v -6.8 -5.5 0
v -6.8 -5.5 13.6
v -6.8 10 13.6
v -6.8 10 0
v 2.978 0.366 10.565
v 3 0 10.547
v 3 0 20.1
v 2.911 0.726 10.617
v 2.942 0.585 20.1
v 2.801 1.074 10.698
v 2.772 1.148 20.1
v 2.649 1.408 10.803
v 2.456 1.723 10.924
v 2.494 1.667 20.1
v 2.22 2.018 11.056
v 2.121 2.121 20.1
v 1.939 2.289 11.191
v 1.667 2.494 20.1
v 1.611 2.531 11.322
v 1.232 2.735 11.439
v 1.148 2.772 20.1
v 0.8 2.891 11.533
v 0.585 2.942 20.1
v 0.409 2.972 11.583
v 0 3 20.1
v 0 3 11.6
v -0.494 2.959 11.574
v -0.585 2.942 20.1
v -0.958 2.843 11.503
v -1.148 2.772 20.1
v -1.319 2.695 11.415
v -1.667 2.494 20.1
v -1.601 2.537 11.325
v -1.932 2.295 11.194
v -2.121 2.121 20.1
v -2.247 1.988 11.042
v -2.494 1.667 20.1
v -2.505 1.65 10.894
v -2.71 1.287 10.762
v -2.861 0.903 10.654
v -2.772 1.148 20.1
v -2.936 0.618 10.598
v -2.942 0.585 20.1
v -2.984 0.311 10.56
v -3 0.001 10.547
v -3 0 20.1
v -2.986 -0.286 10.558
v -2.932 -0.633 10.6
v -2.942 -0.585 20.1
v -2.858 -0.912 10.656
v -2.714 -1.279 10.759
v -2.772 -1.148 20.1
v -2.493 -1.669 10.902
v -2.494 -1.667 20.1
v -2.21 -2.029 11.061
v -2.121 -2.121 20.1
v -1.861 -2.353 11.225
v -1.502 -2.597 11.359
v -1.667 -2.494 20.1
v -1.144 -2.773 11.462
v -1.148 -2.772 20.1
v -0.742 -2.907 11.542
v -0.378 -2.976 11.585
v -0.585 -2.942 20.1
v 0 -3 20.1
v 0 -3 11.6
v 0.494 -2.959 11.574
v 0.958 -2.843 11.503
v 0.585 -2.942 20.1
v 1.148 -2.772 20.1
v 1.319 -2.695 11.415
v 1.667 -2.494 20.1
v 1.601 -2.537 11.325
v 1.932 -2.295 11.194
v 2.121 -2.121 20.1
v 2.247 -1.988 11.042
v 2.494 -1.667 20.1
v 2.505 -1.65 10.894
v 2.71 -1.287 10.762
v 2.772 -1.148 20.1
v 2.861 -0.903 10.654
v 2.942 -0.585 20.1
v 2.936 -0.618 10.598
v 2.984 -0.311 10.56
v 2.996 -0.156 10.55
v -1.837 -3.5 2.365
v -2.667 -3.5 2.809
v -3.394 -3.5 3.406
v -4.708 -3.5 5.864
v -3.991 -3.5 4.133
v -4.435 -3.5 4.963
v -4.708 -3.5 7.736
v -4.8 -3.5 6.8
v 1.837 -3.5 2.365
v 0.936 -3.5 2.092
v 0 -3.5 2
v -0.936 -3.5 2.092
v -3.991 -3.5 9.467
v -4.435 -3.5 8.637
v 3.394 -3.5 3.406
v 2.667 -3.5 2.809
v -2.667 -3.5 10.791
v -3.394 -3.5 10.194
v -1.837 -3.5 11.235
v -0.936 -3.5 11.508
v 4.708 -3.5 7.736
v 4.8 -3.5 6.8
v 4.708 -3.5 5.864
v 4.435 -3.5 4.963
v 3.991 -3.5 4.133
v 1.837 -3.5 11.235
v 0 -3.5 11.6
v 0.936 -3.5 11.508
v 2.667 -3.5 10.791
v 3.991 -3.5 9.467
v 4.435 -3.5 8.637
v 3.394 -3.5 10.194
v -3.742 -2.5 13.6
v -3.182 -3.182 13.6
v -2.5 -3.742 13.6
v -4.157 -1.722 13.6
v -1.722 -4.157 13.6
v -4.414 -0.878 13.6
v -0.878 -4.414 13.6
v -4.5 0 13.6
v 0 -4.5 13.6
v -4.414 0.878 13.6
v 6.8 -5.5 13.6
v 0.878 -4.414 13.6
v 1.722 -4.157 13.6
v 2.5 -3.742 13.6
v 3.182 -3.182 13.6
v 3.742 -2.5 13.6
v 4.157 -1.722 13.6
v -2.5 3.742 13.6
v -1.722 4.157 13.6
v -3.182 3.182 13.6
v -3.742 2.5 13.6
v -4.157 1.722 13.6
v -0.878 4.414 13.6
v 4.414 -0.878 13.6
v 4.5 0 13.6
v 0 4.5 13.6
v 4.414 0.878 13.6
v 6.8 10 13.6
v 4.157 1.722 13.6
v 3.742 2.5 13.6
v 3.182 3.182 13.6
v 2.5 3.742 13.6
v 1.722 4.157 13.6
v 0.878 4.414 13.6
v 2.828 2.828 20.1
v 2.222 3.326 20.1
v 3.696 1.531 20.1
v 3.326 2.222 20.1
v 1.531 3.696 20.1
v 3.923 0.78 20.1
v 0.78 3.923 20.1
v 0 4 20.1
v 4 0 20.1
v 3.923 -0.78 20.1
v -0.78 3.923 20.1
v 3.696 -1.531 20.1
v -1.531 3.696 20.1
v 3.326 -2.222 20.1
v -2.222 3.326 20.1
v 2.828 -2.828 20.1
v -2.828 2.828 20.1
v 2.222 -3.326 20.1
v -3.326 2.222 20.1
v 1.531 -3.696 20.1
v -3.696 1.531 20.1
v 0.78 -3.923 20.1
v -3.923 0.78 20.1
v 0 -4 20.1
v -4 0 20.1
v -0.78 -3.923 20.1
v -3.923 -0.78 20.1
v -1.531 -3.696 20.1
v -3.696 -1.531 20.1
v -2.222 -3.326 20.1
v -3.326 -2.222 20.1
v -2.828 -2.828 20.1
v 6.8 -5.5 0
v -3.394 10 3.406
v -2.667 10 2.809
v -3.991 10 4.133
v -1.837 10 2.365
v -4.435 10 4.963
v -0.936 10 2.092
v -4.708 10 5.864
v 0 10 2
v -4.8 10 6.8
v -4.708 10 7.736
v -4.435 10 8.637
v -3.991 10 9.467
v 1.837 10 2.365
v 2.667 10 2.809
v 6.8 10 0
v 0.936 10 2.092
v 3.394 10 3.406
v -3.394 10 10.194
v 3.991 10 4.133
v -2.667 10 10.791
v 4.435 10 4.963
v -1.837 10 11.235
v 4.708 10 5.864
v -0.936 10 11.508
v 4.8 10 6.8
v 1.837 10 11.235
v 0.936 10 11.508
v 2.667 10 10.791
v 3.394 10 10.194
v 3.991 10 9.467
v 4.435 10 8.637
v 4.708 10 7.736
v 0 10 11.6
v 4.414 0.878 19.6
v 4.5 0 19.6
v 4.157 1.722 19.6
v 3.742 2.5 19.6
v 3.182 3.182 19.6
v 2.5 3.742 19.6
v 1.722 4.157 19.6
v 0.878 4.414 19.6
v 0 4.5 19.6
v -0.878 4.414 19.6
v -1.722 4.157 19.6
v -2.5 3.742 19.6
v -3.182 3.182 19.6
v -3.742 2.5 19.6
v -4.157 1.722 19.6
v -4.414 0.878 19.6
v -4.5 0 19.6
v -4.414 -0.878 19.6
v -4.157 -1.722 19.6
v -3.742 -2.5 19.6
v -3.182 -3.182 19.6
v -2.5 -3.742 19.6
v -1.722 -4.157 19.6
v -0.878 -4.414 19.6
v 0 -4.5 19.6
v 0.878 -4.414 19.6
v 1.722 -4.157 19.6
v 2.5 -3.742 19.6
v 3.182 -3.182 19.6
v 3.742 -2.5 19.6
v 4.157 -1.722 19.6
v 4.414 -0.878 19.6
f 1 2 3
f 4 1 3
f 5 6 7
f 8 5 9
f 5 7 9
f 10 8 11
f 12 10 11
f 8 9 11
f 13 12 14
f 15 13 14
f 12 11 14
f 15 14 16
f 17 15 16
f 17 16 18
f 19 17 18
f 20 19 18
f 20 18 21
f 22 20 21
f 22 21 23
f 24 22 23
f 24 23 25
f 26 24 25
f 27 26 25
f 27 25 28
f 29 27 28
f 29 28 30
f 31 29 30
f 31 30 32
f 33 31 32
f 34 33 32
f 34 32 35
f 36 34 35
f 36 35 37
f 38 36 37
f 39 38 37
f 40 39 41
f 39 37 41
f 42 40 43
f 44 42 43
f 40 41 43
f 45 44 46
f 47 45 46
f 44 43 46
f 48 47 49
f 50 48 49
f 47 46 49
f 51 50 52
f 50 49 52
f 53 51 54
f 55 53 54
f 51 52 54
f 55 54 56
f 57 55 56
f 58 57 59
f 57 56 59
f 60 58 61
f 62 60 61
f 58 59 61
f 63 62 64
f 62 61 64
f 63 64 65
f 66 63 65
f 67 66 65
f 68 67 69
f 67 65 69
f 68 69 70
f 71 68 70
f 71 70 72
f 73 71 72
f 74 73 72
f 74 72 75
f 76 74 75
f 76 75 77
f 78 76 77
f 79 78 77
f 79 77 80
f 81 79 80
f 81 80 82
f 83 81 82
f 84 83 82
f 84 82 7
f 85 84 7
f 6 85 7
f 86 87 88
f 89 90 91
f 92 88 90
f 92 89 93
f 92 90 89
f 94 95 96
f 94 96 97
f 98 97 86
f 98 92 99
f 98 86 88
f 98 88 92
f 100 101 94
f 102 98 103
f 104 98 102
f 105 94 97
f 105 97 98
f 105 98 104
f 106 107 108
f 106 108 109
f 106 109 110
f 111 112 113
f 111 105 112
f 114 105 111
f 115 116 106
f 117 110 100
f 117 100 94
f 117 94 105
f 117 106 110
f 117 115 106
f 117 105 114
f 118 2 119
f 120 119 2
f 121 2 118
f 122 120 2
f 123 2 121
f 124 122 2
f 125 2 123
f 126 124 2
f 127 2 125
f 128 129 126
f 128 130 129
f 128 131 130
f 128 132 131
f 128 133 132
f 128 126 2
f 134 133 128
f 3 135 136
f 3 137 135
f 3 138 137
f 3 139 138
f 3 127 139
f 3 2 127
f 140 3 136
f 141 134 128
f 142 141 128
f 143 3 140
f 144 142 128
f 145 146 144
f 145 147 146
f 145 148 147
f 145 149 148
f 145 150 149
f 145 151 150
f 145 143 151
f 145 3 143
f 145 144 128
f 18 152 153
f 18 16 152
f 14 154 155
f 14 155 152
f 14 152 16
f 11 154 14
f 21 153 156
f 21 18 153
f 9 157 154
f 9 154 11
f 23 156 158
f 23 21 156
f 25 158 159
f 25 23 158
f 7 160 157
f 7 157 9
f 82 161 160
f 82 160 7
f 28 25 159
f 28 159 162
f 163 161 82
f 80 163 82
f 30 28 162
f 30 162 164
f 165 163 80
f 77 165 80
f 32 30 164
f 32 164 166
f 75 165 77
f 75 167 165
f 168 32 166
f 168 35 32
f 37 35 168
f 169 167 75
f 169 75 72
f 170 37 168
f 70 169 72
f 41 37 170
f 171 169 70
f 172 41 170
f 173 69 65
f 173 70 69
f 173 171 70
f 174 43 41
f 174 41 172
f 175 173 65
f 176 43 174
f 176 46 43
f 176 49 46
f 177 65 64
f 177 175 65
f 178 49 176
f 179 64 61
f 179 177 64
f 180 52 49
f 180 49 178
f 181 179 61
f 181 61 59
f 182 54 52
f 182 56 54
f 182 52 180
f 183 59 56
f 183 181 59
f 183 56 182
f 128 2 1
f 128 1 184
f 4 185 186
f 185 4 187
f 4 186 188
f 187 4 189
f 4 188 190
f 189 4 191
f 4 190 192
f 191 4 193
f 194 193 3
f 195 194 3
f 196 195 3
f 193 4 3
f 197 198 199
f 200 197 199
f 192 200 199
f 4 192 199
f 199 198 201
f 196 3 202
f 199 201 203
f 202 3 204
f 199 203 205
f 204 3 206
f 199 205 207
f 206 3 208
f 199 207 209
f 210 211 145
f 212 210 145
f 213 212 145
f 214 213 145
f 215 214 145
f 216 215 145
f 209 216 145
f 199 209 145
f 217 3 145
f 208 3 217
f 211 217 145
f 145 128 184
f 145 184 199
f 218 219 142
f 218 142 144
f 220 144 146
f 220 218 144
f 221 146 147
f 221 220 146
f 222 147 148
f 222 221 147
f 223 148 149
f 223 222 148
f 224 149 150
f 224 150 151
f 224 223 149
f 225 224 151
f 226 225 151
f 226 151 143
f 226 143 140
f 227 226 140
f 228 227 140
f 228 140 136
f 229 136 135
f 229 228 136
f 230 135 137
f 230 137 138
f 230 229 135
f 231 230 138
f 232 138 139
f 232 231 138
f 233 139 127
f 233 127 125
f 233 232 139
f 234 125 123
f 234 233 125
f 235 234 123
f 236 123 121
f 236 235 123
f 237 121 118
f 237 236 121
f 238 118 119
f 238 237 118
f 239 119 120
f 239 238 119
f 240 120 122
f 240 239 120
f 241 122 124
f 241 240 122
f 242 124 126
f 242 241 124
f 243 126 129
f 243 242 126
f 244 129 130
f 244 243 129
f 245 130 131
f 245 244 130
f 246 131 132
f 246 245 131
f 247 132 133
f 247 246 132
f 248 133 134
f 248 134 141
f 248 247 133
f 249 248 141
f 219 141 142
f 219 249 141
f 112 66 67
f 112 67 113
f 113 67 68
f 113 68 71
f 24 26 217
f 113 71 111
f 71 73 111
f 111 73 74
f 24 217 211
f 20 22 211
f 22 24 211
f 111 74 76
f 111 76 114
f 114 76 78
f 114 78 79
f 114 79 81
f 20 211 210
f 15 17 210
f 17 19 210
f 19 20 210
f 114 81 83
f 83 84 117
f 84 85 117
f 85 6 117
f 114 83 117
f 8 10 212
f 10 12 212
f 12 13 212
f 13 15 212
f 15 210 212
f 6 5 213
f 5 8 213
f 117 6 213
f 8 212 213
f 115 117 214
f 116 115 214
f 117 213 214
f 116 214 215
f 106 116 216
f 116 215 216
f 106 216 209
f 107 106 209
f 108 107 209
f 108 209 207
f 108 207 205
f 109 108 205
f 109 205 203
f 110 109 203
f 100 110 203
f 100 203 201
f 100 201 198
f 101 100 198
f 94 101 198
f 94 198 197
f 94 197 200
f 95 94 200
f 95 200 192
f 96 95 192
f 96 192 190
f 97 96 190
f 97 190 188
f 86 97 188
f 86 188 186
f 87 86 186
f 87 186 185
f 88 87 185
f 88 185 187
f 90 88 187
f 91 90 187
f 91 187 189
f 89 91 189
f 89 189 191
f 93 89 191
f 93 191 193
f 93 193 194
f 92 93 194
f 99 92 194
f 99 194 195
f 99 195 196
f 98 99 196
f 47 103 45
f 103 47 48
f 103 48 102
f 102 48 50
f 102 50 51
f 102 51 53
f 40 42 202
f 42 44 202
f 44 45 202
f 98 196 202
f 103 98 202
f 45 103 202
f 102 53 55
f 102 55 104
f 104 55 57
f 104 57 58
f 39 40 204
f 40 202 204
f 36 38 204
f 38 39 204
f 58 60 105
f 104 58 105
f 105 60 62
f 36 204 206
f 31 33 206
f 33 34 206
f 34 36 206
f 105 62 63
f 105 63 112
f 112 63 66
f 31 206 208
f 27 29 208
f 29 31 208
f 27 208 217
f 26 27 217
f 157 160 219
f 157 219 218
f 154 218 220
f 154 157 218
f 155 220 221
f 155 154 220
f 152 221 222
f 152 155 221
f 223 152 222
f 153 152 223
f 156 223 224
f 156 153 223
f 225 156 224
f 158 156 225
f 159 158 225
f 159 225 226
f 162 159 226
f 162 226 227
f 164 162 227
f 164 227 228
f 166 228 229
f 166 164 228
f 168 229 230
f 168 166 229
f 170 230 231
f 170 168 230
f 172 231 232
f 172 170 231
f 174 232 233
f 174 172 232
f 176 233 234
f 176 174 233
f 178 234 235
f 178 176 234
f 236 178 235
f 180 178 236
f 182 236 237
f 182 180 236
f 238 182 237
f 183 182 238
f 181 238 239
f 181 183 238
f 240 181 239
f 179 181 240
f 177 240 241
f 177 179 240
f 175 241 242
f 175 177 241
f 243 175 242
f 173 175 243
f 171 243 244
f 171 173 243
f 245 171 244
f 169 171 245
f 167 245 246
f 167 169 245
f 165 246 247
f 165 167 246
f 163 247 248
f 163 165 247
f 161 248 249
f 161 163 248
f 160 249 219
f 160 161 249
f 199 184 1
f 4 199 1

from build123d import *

# Parameters (mm, degrees)
SKETCH1_R           = 12.8
BOSS_EXTRUDE1_DEPTH = 20.1
SKETCH2_OUTSIDE_W   = 35.882
SKETCH2_OUTSIDE_H   = 35.882
SKETCH2_OUTSIDE_R   = 4.5
CUT_EXTRUDE1_DEPTH  = 6.5
CHAMFER1_SIZE       = 0.5
SKETCH3_R           = 3
CUT_EXTRUDE2_DEPTH  = 10
SKETCH4_OUTSIDE_W   = 35.882
SKETCH4_OUTSIDE_H   = 35.882
SKETCH4_OUTSIDE_W_2 = 13.6
SKETCH4_OUTSIDE_H_2 = 15.5
CUT_EXTRUDE3_DEPTH  = 13.6
SKETCH5_R           = 4.8
CUT_EXTRUDE4_DEPTH  = 13.5


with BuildPart() as part:
    # Sketch1 → Boss-Extrude1 (new body)
    with BuildSketch(Plane.XY):
        with Locations(Location((0, 0, 0), (0, 0, 180))):
            Circle(SKETCH1_R)
    extrude(amount=BOSS_EXTRUDE1_DEPTH)

    # Sketch2 outside → Cut-Extrude1 (cut)
    with BuildSketch(Plane.XY.offset(20.1)):
        Rectangle(SKETCH2_OUTSIDE_W, SKETCH2_OUTSIDE_H)
        Circle(SKETCH2_OUTSIDE_R, mode=Mode.SUBTRACT)
    extrude(amount=-CUT_EXTRUDE1_DEPTH, mode=Mode.SUBTRACT)

    # Chamfer1
    chamfer1_edges = [part.edges().sort_by_distance(p)[0] for p in [
        (-4.5, 0, 20.1),
    ]]
    chamfer(chamfer1_edges, length=CHAMFER1_SIZE)

    # Sketch3 → Cut-Extrude2 (cut)
    with BuildSketch(Plane.XY.offset(20.1)):
        Circle(SKETCH3_R)
    extrude(amount=-CUT_EXTRUDE2_DEPTH, mode=Mode.SUBTRACT)

    # Sketch4 outside → Cut-Extrude3 (cut)
    with BuildSketch(Plane.XY.offset(13.6)):
        Rectangle(SKETCH4_OUTSIDE_W, SKETCH4_OUTSIDE_H)
        with Locations((0, 2.25)):
            Rectangle(SKETCH4_OUTSIDE_W_2, SKETCH4_OUTSIDE_H_2, mode=Mode.SUBTRACT)
    extrude(amount=-CUT_EXTRUDE3_DEPTH, mode=Mode.SUBTRACT)

    # Sketch5 → Cut-Extrude4 (cut)
    with BuildSketch(Plane(origin=(0, 10, 0), x_dir=(1, 0, 0), z_dir=(0, 1, 0))):
        with Locations(Location((0, -6.8, 0), (0, 0, 270))):
            Circle(SKETCH5_R)
    extrude(amount=-CUT_EXTRUDE4_DEPTH, mode=Mode.SUBTRACT)


solid = part.part
